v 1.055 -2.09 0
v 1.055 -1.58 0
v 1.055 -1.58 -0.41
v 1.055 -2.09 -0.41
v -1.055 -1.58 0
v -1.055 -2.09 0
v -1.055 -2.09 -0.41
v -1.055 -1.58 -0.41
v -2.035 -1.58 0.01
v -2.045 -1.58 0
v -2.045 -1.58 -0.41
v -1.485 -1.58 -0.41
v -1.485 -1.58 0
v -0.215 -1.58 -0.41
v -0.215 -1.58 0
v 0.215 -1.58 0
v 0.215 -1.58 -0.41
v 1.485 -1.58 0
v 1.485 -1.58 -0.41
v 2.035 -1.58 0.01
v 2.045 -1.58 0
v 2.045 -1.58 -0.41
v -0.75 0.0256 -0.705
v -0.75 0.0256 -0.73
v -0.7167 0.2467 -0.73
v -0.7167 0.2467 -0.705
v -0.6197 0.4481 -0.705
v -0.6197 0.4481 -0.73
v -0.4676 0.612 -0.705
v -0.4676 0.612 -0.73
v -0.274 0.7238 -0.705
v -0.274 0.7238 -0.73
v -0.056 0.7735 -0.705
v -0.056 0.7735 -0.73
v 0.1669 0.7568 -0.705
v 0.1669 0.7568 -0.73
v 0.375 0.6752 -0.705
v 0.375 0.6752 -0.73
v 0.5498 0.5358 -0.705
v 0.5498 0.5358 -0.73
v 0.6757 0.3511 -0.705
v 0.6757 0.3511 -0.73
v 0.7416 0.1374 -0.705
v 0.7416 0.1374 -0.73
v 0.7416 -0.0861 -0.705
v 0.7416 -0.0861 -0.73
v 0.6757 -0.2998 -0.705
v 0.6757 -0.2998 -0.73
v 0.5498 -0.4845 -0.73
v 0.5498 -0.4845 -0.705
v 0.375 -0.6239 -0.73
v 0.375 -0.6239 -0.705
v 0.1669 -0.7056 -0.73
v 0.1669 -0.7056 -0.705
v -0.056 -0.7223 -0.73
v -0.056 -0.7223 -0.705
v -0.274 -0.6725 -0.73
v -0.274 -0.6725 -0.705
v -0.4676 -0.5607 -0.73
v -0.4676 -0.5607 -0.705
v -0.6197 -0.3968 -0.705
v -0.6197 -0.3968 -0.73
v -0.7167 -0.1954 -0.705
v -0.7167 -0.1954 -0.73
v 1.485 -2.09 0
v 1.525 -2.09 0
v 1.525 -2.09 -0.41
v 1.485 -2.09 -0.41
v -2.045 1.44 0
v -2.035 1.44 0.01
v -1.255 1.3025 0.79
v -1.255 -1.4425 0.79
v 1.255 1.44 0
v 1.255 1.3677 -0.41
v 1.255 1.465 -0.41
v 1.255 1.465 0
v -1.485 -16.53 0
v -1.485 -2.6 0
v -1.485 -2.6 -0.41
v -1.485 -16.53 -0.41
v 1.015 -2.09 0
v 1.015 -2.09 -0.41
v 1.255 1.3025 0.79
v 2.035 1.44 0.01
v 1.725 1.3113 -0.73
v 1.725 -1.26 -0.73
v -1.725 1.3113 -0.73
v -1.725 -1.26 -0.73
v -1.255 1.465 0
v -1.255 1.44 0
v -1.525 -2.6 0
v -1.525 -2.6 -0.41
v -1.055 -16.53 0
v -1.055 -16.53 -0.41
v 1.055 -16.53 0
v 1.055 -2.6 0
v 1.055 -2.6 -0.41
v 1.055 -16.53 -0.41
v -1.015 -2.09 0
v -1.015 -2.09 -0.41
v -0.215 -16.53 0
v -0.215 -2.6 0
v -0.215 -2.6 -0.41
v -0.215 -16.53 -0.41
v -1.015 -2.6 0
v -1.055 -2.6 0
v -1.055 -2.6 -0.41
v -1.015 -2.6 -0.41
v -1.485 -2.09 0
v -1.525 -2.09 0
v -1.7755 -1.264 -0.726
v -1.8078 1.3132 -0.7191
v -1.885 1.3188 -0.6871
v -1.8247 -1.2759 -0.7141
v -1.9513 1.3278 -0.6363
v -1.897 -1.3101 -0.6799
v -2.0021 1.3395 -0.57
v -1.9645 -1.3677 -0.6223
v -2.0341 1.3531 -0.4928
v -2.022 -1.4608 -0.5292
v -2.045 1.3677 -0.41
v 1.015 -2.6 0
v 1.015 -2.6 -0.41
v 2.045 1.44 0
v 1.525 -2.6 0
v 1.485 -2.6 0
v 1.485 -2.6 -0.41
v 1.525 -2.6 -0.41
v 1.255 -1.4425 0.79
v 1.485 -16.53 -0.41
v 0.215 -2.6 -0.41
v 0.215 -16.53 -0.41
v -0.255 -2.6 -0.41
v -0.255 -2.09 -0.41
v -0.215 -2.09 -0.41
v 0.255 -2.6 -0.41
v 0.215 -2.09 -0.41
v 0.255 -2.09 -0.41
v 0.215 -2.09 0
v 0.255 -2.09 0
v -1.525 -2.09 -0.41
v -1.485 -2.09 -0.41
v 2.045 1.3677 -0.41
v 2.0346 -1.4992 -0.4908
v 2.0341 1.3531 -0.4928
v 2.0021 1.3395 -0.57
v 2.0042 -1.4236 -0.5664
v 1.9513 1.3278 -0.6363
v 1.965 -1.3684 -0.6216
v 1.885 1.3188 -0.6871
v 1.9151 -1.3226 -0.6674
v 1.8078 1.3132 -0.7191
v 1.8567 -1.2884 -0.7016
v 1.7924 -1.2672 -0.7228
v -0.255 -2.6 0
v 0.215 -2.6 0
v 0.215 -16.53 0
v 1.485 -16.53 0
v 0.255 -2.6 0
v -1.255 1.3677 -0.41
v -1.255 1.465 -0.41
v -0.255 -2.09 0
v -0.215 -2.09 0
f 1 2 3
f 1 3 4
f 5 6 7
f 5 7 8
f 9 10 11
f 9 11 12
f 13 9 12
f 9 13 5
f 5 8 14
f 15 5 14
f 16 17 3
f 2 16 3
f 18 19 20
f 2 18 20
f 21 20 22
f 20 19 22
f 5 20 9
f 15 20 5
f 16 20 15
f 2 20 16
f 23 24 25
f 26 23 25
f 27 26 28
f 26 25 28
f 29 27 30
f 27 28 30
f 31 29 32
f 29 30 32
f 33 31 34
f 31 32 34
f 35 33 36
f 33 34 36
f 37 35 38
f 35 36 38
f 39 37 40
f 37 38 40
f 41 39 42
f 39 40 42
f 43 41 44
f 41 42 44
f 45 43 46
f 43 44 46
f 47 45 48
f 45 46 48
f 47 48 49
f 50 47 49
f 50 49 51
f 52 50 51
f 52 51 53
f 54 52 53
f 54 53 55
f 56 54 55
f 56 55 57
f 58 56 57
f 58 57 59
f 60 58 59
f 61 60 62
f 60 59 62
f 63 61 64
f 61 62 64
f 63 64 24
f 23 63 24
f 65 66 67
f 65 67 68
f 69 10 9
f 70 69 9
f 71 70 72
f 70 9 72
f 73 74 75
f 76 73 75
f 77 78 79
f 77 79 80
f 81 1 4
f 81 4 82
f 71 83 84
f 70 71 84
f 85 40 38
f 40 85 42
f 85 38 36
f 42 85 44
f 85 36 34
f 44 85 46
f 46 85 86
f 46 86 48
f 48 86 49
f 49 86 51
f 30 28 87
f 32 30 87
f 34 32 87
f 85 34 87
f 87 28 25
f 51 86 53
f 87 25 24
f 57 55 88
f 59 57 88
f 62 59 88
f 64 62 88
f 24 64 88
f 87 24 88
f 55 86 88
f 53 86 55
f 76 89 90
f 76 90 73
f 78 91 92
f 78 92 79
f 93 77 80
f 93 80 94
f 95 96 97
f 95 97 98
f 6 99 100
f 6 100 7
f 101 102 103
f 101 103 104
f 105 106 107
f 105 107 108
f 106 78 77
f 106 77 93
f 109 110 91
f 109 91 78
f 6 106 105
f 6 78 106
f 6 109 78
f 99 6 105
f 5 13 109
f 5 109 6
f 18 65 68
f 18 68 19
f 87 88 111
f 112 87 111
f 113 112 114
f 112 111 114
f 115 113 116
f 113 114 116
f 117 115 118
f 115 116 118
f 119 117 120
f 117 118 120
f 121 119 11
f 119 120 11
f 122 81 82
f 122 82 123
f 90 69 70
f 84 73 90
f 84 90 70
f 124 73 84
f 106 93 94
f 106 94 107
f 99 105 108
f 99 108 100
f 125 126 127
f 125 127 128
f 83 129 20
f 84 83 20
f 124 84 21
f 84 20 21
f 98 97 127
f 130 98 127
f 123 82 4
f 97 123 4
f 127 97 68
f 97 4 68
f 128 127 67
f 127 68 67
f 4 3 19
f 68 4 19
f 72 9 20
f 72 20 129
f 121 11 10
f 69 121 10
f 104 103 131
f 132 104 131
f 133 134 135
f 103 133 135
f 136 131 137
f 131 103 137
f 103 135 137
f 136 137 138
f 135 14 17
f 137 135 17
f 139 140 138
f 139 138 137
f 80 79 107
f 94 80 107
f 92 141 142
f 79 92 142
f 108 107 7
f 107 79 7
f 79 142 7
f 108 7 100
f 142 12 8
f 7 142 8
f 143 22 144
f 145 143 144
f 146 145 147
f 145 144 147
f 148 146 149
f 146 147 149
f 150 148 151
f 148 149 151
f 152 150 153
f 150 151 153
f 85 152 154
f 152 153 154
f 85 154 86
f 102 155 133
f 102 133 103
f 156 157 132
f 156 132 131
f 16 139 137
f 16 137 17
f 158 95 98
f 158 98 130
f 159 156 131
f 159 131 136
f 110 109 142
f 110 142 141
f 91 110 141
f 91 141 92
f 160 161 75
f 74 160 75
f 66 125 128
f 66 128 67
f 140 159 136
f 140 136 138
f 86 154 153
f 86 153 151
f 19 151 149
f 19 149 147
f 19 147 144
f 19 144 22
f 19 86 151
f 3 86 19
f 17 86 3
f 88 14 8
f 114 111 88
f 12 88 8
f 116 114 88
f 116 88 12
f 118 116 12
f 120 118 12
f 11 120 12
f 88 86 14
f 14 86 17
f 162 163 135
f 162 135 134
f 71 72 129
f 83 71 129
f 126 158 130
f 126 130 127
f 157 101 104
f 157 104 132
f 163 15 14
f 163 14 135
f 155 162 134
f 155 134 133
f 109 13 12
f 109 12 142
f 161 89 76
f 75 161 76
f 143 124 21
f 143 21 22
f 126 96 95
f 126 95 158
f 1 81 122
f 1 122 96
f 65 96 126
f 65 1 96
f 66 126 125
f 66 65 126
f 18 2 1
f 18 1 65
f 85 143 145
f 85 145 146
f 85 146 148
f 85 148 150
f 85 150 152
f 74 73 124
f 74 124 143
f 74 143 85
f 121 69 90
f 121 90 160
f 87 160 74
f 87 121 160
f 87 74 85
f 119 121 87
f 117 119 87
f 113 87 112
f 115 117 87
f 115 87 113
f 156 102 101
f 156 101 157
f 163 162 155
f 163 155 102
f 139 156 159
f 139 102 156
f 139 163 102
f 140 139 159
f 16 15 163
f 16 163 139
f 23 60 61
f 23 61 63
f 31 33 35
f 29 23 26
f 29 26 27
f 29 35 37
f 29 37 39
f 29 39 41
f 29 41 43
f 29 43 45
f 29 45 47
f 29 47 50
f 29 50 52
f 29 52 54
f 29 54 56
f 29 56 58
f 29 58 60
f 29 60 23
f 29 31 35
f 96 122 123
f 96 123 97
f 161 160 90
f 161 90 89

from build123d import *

# Parameters (mm, degrees)
BOSS_EXTRUDE1_DEPTH      = 1.44
BOSS_EXTRUDE1_DEPTH_BACK = 1.58
CUT_EXTRUDE1_START       = -2.045
CUT_EXTRUDE1_DEPTH       = 4.09
SKETCH3_W                = 2.51
SKETCH3_H                = 0.162535045
BOSS_EXTRUDE2_DEPTH      = 0.41
SKETCH4_R                = 0.75
CUT_EXTRUDE2_DEPTH       = 0.025


with BuildPart() as part:
    # Sketch1 → Boss-Extrude1 (new, two sides: drawn at the far end of the back side and taken through both)
    with BuildSketch(Plane(origin=(0, 0, 0), x_dir=(1, 0, 0), z_dir=(0, 1, 0)).offset(-BOSS_EXTRUDE1_DEPTH_BACK)):
        with BuildLine():
            Line((-2.045, 0), (-1.255, -0.79))
            Line((-1.255, -0.79), (1.255, -0.79))
            Line((1.255, -0.79), (2.045, 0))
            Line((2.045, 0), (2.045, 0.41))
            ThreePointArc((2.045, 0.41), (1.95127417, 0.63627417), (1.725, 0.73))
            Line((1.725, 0.73), (-1.725, 0.73))
            ThreePointArc((-1.725, 0.73), (-1.95127417, 0.63627417), (-2.045, 0.41))
            Line((-2.045, 0.41), (-2.045, 0))
        make_face()
    extrude(amount=BOSS_EXTRUDE1_DEPTH + BOSS_EXTRUDE1_DEPTH_BACK)

    # Sketch2 → Cut-Extrude1 (cut)
    with BuildSketch(Plane(origin=(0, 0, 0), x_dir=(0, 0, -1), z_dir=(1, 0, 0)).offset(CUT_EXTRUDE1_START)):
        Polygon((0.41, -1.58), (0.73, -1.58), (0.73, -1.26), align=None)
        Polygon((-0.01, 1.44), (-0.79, 1.44), (-0.79, 1.302464955), align=None)
        Polygon((-0.01, -1.58), (-0.79, -1.442464955), (-0.79, -1.58), align=None)
        Polygon((0.73, 1.311281304), (0.73, 1.44), (0, 1.44), align=None)
    extrude(amount=CUT_EXTRUDE1_DEPTH, mode=Mode.SUBTRACT)

    # Sketch3 → Boss-Extrude2 (add)
    with BuildSketch(Plane.XY):
        Polygon((1.485, -1.58), (1.055, -1.58), (1.055, -2.09), (1.015, -2.09), (1.015, -2.6), (1.055, -2.6), (1.055, -16.53), (1.485, -16.53), (1.485, -2.6), (1.525, -2.6), (1.525, -2.09), (1.485, -2.09), align=None)
        Polygon((0.215, -1.58), (-0.215, -1.58), (-0.215, -2.09), (-0.255, -2.09), (-0.255, -2.6), (-0.215, -2.6), (-0.215, -16.53), (0.215, -16.53), (0.215, -2.6), (0.255, -2.6), (0.255, -2.09), (0.215, -2.09), align=None)
        Polygon((-1.055, -1.58), (-1.485, -1.58), (-1.485, -2.09), (-1.525, -2.09), (-1.525, -2.6), (-1.485, -2.6), (-1.485, -16.53), (-1.055, -16.53), (-1.055, -2.6), (-1.015, -2.6), (-1.015, -2.09), (-1.055, -2.09), align=None)
        with Locations((0, 1.383732478)):
            Rectangle(SKETCH3_W, SKETCH3_H)
    extrude(amount=-BOSS_EXTRUDE2_DEPTH)

    # Sketch4 → Cut-Extrude2 (cut)
    with BuildSketch(Plane(origin=(0, 0, -0.73), x_dir=(-1, 0, 0), z_dir=(0, 0, -1))):
        with Locations((0, 0.025640652)):
            Circle(SKETCH4_R)
    extrude(amount=-CUT_EXTRUDE2_DEPTH, mode=Mode.SUBTRACT)


solid = part.part
